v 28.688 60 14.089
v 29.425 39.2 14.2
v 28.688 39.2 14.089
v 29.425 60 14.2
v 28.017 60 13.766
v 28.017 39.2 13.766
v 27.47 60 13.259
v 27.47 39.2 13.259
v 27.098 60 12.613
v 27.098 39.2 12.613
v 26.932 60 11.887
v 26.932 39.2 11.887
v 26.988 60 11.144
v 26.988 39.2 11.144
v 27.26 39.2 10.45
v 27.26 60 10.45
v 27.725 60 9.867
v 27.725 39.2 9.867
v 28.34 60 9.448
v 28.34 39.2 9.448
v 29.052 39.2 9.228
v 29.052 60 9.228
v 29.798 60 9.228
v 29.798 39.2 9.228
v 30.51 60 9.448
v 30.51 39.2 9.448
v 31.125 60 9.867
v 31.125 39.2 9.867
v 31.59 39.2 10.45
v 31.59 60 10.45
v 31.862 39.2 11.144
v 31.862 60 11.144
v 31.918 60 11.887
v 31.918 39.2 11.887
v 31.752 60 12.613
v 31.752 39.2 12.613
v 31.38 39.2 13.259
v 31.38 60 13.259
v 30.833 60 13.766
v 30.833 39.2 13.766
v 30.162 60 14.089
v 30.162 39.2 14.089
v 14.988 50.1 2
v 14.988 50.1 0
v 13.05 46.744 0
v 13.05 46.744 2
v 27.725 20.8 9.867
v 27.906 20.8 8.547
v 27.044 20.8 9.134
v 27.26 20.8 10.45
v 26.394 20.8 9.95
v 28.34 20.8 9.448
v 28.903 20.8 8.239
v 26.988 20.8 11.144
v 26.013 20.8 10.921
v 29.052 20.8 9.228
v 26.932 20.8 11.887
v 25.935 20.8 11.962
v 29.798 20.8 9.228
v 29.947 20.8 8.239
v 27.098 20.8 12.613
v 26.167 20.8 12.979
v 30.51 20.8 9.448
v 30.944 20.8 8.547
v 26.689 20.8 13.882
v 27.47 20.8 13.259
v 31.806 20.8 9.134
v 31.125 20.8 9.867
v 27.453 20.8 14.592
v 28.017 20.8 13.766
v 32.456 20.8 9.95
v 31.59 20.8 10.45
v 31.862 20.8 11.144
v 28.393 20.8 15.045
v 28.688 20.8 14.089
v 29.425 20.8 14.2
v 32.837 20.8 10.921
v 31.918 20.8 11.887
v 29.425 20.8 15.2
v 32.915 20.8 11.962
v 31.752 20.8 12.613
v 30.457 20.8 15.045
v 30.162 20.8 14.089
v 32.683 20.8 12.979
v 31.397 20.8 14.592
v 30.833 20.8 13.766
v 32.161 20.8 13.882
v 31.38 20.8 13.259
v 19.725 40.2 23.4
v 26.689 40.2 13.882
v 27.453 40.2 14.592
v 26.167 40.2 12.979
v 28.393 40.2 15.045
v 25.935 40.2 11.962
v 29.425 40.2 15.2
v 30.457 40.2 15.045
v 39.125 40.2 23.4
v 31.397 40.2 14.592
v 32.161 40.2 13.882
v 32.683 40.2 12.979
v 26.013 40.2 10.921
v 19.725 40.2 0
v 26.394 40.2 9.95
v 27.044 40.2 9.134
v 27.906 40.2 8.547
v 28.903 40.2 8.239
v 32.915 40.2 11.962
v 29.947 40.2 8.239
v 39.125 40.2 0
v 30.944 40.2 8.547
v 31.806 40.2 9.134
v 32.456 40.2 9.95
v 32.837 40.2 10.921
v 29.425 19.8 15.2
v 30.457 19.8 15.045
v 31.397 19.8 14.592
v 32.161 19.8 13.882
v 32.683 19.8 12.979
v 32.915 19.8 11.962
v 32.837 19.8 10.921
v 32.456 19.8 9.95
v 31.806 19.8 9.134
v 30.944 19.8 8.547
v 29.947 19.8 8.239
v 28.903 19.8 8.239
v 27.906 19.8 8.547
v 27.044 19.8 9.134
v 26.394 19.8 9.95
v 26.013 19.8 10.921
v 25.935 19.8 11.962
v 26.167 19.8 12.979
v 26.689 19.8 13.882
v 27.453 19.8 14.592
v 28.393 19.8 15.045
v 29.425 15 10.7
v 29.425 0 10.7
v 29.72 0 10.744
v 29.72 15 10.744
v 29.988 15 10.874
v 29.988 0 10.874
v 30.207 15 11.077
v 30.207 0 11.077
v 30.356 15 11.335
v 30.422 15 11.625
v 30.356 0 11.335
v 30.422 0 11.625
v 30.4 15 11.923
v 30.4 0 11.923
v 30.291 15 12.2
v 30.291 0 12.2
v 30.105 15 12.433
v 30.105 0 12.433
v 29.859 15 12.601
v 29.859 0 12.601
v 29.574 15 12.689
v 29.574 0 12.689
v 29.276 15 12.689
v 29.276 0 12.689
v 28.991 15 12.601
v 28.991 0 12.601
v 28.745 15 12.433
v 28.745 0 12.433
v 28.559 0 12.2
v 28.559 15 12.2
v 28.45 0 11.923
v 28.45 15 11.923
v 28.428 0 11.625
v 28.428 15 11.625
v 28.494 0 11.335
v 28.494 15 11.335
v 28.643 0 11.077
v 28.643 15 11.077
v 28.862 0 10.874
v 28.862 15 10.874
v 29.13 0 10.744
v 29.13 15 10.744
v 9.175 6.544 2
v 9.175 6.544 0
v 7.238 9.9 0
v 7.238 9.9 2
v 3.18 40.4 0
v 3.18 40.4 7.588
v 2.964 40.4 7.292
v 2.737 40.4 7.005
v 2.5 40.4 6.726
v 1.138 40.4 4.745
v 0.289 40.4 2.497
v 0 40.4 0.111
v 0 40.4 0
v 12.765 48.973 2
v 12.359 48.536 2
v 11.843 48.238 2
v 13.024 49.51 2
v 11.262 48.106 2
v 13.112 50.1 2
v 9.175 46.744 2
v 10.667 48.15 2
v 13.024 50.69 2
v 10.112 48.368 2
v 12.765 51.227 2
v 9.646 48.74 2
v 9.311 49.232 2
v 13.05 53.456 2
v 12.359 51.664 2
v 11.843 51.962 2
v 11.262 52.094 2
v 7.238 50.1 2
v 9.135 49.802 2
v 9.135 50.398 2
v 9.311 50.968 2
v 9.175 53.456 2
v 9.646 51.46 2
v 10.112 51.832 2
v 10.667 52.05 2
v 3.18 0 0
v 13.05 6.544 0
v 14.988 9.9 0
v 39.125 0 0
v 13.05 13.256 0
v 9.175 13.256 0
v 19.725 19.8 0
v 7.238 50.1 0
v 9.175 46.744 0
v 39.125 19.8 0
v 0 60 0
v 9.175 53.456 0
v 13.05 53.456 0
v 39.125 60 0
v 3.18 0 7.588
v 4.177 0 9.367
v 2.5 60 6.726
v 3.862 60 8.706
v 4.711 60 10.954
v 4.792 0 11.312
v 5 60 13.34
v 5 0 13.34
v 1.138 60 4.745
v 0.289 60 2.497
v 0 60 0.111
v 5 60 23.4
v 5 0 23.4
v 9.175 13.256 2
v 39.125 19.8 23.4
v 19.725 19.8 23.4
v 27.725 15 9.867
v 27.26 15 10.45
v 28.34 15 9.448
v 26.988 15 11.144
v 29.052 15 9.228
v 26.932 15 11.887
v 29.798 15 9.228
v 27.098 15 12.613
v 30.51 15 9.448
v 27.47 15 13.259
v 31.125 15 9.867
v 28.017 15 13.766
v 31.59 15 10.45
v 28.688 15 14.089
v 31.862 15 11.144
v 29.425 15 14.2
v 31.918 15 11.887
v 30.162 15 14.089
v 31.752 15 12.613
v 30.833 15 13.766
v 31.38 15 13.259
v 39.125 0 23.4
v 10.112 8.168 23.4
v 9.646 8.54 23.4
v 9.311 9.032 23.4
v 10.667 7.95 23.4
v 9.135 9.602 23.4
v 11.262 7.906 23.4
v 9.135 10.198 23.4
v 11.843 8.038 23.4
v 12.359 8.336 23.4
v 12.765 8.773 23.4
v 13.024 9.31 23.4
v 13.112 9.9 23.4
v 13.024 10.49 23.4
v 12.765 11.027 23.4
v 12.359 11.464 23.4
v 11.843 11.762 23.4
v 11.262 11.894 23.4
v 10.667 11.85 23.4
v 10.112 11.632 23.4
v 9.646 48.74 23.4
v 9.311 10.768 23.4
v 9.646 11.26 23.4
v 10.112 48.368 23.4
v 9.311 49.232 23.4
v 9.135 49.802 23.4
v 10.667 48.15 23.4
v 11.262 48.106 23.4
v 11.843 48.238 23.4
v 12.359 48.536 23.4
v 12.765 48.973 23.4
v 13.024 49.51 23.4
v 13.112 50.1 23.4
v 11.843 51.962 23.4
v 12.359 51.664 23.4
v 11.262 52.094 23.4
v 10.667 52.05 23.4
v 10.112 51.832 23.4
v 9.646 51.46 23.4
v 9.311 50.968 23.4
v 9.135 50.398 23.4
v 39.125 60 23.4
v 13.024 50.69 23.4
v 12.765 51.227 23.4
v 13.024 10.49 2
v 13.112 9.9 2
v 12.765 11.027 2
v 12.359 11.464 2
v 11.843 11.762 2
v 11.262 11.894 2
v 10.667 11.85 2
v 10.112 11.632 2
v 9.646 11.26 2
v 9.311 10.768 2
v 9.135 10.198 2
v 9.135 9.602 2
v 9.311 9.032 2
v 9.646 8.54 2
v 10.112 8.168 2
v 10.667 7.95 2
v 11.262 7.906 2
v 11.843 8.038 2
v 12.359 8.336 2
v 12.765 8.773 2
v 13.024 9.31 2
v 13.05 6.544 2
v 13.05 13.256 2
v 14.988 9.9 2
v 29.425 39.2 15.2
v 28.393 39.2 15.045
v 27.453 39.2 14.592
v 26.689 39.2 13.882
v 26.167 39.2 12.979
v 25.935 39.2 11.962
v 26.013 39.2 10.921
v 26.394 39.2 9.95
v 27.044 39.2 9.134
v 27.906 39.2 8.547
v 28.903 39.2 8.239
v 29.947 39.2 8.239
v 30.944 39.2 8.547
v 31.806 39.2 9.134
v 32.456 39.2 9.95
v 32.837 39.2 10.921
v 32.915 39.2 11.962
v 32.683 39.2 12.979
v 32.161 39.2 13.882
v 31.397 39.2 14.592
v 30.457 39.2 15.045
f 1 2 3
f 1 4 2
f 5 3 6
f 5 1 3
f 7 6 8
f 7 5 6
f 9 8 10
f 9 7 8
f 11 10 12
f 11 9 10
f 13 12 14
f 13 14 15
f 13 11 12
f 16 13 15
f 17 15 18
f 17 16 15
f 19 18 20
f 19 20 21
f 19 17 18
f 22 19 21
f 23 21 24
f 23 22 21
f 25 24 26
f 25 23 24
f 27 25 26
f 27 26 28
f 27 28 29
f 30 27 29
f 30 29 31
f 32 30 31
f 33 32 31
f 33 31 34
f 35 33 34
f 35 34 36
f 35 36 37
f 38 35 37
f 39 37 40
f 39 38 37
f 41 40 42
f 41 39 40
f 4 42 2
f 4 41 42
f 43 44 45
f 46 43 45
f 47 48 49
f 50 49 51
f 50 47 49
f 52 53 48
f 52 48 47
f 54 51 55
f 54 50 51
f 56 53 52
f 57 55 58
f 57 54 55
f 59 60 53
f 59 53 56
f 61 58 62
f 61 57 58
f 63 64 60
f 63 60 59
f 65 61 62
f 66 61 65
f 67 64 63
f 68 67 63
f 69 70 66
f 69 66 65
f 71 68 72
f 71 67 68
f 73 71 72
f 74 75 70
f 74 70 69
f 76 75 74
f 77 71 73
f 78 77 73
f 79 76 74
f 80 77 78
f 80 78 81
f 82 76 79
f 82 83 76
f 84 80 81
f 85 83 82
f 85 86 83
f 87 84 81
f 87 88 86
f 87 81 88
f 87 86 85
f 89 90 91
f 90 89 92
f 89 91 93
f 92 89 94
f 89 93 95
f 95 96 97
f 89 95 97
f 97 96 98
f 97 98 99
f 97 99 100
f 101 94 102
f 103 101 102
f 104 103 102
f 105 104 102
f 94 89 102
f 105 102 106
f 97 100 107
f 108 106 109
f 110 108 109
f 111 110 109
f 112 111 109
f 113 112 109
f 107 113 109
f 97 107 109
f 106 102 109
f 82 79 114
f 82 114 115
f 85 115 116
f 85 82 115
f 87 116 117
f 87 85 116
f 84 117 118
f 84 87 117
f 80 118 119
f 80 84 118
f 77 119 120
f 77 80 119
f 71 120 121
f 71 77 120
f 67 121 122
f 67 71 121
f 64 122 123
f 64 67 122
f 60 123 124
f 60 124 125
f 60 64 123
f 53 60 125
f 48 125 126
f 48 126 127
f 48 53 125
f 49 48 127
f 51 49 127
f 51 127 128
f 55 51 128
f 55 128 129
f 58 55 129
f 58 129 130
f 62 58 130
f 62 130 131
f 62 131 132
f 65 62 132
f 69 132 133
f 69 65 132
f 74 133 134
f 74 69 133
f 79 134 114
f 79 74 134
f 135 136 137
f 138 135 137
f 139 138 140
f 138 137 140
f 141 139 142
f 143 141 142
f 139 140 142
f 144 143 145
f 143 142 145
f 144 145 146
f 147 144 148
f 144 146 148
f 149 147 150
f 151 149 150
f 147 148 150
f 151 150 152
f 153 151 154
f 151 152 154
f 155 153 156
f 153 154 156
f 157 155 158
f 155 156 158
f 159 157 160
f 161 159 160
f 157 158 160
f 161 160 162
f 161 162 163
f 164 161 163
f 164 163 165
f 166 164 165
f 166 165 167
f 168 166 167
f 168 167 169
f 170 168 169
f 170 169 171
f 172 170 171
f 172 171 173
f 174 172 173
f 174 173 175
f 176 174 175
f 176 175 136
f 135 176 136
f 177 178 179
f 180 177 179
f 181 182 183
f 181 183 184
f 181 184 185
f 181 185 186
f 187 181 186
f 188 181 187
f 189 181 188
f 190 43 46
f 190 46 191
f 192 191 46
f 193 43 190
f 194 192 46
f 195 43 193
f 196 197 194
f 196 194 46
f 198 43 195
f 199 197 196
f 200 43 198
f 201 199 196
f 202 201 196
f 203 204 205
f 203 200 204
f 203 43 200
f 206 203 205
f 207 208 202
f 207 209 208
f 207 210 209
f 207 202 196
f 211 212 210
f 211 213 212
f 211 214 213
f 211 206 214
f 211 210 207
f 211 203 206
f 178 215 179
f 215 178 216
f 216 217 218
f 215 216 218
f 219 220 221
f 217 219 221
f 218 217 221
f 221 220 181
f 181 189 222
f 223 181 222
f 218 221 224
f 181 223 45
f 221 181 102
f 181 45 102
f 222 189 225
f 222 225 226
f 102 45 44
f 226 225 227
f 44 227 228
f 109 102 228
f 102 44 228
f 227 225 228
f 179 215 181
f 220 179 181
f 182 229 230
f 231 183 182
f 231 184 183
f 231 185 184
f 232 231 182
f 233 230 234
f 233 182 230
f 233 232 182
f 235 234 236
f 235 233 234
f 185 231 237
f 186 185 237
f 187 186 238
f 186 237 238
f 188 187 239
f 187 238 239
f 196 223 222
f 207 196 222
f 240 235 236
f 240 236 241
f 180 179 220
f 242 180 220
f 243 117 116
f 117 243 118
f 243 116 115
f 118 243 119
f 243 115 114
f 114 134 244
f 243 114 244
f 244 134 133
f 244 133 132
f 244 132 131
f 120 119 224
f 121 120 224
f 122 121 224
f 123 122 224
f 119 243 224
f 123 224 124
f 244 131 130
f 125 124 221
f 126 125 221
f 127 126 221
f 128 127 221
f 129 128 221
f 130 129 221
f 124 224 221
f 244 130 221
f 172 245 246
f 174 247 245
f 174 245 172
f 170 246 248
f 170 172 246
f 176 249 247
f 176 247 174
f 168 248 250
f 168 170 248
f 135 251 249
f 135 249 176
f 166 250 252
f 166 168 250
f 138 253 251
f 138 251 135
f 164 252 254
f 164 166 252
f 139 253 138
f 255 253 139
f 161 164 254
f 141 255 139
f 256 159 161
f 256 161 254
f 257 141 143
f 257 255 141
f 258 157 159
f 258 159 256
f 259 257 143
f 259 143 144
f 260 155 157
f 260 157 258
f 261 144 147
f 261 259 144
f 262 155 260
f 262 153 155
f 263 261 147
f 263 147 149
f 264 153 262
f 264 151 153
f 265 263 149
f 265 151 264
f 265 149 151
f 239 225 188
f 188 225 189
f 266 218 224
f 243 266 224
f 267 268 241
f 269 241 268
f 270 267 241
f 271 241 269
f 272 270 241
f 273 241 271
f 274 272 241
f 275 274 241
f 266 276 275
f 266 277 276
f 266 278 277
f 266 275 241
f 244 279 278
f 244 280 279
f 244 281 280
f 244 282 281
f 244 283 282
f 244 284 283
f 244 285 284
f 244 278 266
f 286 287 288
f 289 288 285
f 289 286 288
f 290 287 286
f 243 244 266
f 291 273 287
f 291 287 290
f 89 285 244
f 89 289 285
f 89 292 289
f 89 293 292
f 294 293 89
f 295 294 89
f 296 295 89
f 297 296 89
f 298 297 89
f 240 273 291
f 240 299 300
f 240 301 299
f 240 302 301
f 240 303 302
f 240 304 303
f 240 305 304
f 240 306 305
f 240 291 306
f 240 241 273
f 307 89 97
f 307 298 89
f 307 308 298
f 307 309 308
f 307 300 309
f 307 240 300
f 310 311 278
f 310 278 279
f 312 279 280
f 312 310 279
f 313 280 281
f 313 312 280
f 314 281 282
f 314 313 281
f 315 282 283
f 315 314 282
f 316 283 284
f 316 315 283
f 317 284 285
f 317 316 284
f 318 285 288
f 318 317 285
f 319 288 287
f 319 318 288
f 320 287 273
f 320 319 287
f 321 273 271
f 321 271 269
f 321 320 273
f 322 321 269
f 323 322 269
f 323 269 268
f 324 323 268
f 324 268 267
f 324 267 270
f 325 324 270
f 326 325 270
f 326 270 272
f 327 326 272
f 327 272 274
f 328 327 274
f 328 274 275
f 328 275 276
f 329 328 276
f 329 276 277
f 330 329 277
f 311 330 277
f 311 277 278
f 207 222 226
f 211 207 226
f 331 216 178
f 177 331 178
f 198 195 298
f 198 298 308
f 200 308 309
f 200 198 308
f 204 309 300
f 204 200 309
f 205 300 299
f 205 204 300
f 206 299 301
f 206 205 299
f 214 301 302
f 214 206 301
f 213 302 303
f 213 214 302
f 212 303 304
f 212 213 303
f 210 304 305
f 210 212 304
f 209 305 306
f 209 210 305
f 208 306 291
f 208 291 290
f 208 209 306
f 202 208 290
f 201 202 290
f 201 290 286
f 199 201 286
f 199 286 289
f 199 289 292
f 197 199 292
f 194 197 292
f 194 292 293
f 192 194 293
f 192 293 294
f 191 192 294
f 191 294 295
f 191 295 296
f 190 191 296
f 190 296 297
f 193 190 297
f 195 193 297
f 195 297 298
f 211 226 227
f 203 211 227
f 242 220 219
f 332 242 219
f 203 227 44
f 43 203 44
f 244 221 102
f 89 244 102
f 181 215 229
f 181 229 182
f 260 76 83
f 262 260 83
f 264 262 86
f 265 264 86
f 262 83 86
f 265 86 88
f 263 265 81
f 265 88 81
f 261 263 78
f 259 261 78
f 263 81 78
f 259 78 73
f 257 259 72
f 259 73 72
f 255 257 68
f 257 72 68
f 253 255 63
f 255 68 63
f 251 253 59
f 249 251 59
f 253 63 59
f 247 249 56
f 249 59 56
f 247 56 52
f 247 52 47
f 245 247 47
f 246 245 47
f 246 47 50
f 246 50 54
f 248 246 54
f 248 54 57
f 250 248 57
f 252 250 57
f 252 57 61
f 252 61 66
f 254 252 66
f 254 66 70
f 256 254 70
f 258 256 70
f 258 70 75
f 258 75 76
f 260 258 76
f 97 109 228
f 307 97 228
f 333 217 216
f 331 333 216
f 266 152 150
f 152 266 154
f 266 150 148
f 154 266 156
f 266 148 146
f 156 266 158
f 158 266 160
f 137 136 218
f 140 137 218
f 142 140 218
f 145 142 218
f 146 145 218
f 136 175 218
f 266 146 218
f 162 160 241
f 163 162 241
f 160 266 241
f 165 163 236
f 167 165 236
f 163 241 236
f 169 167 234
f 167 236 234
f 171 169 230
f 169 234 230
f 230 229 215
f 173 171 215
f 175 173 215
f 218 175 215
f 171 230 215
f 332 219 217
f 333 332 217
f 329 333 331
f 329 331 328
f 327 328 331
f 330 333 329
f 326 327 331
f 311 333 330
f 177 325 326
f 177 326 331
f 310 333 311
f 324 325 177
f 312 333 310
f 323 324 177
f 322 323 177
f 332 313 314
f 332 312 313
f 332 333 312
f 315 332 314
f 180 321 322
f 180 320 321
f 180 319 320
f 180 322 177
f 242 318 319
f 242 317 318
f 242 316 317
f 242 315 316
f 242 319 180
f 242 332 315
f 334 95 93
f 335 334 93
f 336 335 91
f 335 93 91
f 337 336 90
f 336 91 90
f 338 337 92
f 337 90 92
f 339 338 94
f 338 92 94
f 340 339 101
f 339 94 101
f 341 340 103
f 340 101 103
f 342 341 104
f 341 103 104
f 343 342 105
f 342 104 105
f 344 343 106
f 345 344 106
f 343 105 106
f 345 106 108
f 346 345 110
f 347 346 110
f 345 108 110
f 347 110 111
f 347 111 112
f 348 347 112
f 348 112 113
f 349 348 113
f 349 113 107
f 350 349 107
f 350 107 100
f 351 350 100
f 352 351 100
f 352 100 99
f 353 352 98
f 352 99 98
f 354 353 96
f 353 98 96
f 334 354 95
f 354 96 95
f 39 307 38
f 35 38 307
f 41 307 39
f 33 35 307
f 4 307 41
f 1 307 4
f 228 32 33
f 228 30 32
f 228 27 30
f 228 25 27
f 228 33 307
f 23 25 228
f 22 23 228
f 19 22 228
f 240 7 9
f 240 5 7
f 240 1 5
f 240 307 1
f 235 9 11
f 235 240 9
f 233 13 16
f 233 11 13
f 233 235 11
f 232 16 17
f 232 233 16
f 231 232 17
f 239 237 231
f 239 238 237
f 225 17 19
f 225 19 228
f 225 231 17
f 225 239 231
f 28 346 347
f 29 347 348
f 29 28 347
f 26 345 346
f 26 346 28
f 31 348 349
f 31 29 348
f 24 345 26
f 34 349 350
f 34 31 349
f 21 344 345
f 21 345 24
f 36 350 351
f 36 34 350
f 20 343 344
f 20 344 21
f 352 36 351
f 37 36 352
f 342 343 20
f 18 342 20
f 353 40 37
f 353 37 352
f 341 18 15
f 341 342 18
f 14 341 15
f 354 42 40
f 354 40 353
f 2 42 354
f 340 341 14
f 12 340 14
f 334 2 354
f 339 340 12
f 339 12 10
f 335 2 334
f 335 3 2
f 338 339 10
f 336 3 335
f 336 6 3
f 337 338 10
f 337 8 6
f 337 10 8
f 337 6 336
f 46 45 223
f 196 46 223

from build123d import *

# Parameters (mm, degrees)
MAINBLOCK_R                     = 2
MAINBLOCKBOSS_EXTRUDE1_DEPTH    = 23.4
TOPHOLECUT_SKETCH2_R            = 2.5
TOPHOLECUT_EXTRUDE1_DEPTH       = 45
TOPSPACERSKETCH4_R              = 3.5
TOPSPACERSKETCH4_R_2            = 2.5
TOPSPACERBOSS_EXTRUDE2_DEPTH    = 1
LOWERSPACERBOSS_EXTRUDE3_START  = 1
LOWERSPACERSKETCH5_R            = 3.5
LOWERSPACERSKETCH5_R_2          = 2.5
LOWERSPACERBOSS_EXTRUDE3_DEPTH  = 1
MOUNTHOLEBORECUT_EXTRUDE1_DEPTH = 2
PUSHPINHOLESKETCH1_R            = 1
PUSHPINHOLECUT_EXTRUDE1_DEPTH   = 76.354665582
SCREWCOLLISIONSKETCH1_W         = 18.72
SCREWCOLLISIONSKETCH1_H         = 60
CUT_EXTRUDE1_DEPTH              = 5
FILLET1_R                       = 10
FILLET2_R                       = 10
MIDRAILINSETSKETCH1_W           = 3.18
MIDRAILINSETSKETCH1_H           = 40.4
MIDRAILINSETCUT_EXTRUDE2_DEPTH  = 76.354665582


with BuildPart() as part:
    # MainBlock → MainBlockBoss-Extrude1 (new body)
    with BuildSketch(Plane.XY):
        Polygon((0, 0), (39.125, 0), (39.125, 19.8), (19.725, 19.8), (19.725, 40.2), (39.125, 40.2), (39.125, 60), (0, 60), align=None)
        with Locations((11.1125, 50.1)):
            Circle(MAINBLOCK_R, mode=Mode.SUBTRACT)
        with Locations((11.1125, 9.9)):
            Circle(MAINBLOCK_R, mode=Mode.SUBTRACT)
    extrude(amount=MAINBLOCKBOSS_EXTRUDE1_DEPTH)

    # TopHoleCut-Sketch2 → TopHoleCut-Extrude1 (cut)
    with BuildSketch(Plane(origin=(0, 60, 0), x_dir=(1, 0, 0), z_dir=(0, 1, 0))):
        with Locations(Location((29.425, -11.7, 0), (0, 0, 270))):
            Circle(TOPHOLECUT_SKETCH2_R)
    extrude(amount=-TOPHOLECUT_EXTRUDE1_DEPTH, mode=Mode.SUBTRACT)

    # TopSpacerSketch4 → TopSpacerBoss-Extrude2 (add)
    with BuildSketch(Plane.XZ.offset(-40.2)):
        with Locations(Location((29.425, 11.7, 0), (0, 0, 90))):
            Circle(TOPSPACERSKETCH4_R)
        with Locations(Location((29.425, 11.7, 0), (0, 0, 90))):
            Circle(TOPSPACERSKETCH4_R_2, mode=Mode.SUBTRACT)
    extrude(amount=TOPSPACERBOSS_EXTRUDE2_DEPTH)

    # LowerSpacerSketch5 → LowerSpacerBoss-Extrude3 (add)
    with BuildSketch(Plane(origin=(0, 19.8, 0), x_dir=(1, 0, 0), z_dir=(0, 1, 0)).offset(LOWERSPACERBOSS_EXTRUDE3_START)):
        with Locations(Location((29.425, -11.7, 0), (0, 0, 270))):
            Circle(LOWERSPACERSKETCH5_R)
        with Locations(Location((29.425, -11.7, 0), (0, 0, 270))):
            Circle(LOWERSPACERSKETCH5_R_2, mode=Mode.SUBTRACT)
    extrude(amount=-LOWERSPACERBOSS_EXTRUDE3_DEPTH)

    # MountHoleBoreSketch1 → MountHoleBoreCut-Extrude1 (cut)
    with BuildSketch(Plane(origin=(0, 0, 0), x_dir=(-1, 0, 0), z_dir=(0, 0, -1))):
        Polygon((-7.2375, 50.1), (-9.175, 53.45584844), (-13.05, 53.45584844), (-14.9875, 50.1), (-13.05, 46.74415156), (-9.175, 46.74415156), align=None)
        Polygon((-7.2375, 9.9), (-9.175, 13.25584844), (-13.05, 13.25584844), (-14.9875, 9.9), (-13.05, 6.54415156), (-9.175, 6.54415156), align=None)
    extrude(amount=-MOUNTHOLEBORECUT_EXTRUDE1_DEPTH, mode=Mode.SUBTRACT)

    # PushPinHoleSketch1 → PushPinHoleCut-Extrude1 (cut, through all)
    with BuildSketch(Plane.XZ):
        with Locations(Location((29.425, 11.7, 0), (0, 0, 270))):
            Circle(PUSHPINHOLESKETCH1_R)
    extrude(amount=-PUSHPINHOLECUT_EXTRUDE1_DEPTH, mode=Mode.SUBTRACT)

    # ScrewCollisionSketch1 → Cut-Extrude1 (cut)
    with BuildSketch(Plane.ZY):
        with Locations((14.04, 30)):
            Rectangle(SCREWCOLLISIONSKETCH1_W, SCREWCOLLISIONSKETCH1_H)
    extrude(amount=-CUT_EXTRUDE1_DEPTH, mode=Mode.SUBTRACT)

    # Fillet1
    # the kernel refuses this fillet: 10 mm, written as the material it adds along each edge
    with BuildSketch(Plane(origin=(5, 60, 4.68), x_dir=(0, 0, 1), z_dir=(0, -1, 0))) as fillet1_piece_1:
        with BuildLine():
            CenterArc((8.660254038, 10), FILLET1_R, 210, 60)
            Line((0, 5), (-0.173205081, 4.9))
            ThreePointArc((-0.173205081, 4.9), (-0.2, 2.5), (-0.2, 0))
            Line((-0.2, 0), (0, -0.2))
            Line((0, -0.2), (8.660254038, -0.2))
            Line((8.660254038, -0.2), (8.660254038, 0))
        make_face()
    extrude(amount=60)

    # Fillet2
    fillet2_edges = [part.edges().sort_by_distance(p)[0] for p in [
        (0, 30, 4.68),
    ]]
    fillet(fillet2_edges, radius=FILLET2_R)

    # MidRailInsetSketch1 → MidRailInsetCut-Extrude2 (cut, through all)
    with BuildSketch(Plane(origin=(0, 0, 0), x_dir=(-1, 0, 0), z_dir=(0, 0, -1))):
        with Locations((-1.59, 20.2)):
            Rectangle(MIDRAILINSETSKETCH1_W, MIDRAILINSETSKETCH1_H)
    extrude(amount=-MIDRAILINSETCUT_EXTRUDE2_DEPTH, mode=Mode.SUBTRACT)


solid = part.part
